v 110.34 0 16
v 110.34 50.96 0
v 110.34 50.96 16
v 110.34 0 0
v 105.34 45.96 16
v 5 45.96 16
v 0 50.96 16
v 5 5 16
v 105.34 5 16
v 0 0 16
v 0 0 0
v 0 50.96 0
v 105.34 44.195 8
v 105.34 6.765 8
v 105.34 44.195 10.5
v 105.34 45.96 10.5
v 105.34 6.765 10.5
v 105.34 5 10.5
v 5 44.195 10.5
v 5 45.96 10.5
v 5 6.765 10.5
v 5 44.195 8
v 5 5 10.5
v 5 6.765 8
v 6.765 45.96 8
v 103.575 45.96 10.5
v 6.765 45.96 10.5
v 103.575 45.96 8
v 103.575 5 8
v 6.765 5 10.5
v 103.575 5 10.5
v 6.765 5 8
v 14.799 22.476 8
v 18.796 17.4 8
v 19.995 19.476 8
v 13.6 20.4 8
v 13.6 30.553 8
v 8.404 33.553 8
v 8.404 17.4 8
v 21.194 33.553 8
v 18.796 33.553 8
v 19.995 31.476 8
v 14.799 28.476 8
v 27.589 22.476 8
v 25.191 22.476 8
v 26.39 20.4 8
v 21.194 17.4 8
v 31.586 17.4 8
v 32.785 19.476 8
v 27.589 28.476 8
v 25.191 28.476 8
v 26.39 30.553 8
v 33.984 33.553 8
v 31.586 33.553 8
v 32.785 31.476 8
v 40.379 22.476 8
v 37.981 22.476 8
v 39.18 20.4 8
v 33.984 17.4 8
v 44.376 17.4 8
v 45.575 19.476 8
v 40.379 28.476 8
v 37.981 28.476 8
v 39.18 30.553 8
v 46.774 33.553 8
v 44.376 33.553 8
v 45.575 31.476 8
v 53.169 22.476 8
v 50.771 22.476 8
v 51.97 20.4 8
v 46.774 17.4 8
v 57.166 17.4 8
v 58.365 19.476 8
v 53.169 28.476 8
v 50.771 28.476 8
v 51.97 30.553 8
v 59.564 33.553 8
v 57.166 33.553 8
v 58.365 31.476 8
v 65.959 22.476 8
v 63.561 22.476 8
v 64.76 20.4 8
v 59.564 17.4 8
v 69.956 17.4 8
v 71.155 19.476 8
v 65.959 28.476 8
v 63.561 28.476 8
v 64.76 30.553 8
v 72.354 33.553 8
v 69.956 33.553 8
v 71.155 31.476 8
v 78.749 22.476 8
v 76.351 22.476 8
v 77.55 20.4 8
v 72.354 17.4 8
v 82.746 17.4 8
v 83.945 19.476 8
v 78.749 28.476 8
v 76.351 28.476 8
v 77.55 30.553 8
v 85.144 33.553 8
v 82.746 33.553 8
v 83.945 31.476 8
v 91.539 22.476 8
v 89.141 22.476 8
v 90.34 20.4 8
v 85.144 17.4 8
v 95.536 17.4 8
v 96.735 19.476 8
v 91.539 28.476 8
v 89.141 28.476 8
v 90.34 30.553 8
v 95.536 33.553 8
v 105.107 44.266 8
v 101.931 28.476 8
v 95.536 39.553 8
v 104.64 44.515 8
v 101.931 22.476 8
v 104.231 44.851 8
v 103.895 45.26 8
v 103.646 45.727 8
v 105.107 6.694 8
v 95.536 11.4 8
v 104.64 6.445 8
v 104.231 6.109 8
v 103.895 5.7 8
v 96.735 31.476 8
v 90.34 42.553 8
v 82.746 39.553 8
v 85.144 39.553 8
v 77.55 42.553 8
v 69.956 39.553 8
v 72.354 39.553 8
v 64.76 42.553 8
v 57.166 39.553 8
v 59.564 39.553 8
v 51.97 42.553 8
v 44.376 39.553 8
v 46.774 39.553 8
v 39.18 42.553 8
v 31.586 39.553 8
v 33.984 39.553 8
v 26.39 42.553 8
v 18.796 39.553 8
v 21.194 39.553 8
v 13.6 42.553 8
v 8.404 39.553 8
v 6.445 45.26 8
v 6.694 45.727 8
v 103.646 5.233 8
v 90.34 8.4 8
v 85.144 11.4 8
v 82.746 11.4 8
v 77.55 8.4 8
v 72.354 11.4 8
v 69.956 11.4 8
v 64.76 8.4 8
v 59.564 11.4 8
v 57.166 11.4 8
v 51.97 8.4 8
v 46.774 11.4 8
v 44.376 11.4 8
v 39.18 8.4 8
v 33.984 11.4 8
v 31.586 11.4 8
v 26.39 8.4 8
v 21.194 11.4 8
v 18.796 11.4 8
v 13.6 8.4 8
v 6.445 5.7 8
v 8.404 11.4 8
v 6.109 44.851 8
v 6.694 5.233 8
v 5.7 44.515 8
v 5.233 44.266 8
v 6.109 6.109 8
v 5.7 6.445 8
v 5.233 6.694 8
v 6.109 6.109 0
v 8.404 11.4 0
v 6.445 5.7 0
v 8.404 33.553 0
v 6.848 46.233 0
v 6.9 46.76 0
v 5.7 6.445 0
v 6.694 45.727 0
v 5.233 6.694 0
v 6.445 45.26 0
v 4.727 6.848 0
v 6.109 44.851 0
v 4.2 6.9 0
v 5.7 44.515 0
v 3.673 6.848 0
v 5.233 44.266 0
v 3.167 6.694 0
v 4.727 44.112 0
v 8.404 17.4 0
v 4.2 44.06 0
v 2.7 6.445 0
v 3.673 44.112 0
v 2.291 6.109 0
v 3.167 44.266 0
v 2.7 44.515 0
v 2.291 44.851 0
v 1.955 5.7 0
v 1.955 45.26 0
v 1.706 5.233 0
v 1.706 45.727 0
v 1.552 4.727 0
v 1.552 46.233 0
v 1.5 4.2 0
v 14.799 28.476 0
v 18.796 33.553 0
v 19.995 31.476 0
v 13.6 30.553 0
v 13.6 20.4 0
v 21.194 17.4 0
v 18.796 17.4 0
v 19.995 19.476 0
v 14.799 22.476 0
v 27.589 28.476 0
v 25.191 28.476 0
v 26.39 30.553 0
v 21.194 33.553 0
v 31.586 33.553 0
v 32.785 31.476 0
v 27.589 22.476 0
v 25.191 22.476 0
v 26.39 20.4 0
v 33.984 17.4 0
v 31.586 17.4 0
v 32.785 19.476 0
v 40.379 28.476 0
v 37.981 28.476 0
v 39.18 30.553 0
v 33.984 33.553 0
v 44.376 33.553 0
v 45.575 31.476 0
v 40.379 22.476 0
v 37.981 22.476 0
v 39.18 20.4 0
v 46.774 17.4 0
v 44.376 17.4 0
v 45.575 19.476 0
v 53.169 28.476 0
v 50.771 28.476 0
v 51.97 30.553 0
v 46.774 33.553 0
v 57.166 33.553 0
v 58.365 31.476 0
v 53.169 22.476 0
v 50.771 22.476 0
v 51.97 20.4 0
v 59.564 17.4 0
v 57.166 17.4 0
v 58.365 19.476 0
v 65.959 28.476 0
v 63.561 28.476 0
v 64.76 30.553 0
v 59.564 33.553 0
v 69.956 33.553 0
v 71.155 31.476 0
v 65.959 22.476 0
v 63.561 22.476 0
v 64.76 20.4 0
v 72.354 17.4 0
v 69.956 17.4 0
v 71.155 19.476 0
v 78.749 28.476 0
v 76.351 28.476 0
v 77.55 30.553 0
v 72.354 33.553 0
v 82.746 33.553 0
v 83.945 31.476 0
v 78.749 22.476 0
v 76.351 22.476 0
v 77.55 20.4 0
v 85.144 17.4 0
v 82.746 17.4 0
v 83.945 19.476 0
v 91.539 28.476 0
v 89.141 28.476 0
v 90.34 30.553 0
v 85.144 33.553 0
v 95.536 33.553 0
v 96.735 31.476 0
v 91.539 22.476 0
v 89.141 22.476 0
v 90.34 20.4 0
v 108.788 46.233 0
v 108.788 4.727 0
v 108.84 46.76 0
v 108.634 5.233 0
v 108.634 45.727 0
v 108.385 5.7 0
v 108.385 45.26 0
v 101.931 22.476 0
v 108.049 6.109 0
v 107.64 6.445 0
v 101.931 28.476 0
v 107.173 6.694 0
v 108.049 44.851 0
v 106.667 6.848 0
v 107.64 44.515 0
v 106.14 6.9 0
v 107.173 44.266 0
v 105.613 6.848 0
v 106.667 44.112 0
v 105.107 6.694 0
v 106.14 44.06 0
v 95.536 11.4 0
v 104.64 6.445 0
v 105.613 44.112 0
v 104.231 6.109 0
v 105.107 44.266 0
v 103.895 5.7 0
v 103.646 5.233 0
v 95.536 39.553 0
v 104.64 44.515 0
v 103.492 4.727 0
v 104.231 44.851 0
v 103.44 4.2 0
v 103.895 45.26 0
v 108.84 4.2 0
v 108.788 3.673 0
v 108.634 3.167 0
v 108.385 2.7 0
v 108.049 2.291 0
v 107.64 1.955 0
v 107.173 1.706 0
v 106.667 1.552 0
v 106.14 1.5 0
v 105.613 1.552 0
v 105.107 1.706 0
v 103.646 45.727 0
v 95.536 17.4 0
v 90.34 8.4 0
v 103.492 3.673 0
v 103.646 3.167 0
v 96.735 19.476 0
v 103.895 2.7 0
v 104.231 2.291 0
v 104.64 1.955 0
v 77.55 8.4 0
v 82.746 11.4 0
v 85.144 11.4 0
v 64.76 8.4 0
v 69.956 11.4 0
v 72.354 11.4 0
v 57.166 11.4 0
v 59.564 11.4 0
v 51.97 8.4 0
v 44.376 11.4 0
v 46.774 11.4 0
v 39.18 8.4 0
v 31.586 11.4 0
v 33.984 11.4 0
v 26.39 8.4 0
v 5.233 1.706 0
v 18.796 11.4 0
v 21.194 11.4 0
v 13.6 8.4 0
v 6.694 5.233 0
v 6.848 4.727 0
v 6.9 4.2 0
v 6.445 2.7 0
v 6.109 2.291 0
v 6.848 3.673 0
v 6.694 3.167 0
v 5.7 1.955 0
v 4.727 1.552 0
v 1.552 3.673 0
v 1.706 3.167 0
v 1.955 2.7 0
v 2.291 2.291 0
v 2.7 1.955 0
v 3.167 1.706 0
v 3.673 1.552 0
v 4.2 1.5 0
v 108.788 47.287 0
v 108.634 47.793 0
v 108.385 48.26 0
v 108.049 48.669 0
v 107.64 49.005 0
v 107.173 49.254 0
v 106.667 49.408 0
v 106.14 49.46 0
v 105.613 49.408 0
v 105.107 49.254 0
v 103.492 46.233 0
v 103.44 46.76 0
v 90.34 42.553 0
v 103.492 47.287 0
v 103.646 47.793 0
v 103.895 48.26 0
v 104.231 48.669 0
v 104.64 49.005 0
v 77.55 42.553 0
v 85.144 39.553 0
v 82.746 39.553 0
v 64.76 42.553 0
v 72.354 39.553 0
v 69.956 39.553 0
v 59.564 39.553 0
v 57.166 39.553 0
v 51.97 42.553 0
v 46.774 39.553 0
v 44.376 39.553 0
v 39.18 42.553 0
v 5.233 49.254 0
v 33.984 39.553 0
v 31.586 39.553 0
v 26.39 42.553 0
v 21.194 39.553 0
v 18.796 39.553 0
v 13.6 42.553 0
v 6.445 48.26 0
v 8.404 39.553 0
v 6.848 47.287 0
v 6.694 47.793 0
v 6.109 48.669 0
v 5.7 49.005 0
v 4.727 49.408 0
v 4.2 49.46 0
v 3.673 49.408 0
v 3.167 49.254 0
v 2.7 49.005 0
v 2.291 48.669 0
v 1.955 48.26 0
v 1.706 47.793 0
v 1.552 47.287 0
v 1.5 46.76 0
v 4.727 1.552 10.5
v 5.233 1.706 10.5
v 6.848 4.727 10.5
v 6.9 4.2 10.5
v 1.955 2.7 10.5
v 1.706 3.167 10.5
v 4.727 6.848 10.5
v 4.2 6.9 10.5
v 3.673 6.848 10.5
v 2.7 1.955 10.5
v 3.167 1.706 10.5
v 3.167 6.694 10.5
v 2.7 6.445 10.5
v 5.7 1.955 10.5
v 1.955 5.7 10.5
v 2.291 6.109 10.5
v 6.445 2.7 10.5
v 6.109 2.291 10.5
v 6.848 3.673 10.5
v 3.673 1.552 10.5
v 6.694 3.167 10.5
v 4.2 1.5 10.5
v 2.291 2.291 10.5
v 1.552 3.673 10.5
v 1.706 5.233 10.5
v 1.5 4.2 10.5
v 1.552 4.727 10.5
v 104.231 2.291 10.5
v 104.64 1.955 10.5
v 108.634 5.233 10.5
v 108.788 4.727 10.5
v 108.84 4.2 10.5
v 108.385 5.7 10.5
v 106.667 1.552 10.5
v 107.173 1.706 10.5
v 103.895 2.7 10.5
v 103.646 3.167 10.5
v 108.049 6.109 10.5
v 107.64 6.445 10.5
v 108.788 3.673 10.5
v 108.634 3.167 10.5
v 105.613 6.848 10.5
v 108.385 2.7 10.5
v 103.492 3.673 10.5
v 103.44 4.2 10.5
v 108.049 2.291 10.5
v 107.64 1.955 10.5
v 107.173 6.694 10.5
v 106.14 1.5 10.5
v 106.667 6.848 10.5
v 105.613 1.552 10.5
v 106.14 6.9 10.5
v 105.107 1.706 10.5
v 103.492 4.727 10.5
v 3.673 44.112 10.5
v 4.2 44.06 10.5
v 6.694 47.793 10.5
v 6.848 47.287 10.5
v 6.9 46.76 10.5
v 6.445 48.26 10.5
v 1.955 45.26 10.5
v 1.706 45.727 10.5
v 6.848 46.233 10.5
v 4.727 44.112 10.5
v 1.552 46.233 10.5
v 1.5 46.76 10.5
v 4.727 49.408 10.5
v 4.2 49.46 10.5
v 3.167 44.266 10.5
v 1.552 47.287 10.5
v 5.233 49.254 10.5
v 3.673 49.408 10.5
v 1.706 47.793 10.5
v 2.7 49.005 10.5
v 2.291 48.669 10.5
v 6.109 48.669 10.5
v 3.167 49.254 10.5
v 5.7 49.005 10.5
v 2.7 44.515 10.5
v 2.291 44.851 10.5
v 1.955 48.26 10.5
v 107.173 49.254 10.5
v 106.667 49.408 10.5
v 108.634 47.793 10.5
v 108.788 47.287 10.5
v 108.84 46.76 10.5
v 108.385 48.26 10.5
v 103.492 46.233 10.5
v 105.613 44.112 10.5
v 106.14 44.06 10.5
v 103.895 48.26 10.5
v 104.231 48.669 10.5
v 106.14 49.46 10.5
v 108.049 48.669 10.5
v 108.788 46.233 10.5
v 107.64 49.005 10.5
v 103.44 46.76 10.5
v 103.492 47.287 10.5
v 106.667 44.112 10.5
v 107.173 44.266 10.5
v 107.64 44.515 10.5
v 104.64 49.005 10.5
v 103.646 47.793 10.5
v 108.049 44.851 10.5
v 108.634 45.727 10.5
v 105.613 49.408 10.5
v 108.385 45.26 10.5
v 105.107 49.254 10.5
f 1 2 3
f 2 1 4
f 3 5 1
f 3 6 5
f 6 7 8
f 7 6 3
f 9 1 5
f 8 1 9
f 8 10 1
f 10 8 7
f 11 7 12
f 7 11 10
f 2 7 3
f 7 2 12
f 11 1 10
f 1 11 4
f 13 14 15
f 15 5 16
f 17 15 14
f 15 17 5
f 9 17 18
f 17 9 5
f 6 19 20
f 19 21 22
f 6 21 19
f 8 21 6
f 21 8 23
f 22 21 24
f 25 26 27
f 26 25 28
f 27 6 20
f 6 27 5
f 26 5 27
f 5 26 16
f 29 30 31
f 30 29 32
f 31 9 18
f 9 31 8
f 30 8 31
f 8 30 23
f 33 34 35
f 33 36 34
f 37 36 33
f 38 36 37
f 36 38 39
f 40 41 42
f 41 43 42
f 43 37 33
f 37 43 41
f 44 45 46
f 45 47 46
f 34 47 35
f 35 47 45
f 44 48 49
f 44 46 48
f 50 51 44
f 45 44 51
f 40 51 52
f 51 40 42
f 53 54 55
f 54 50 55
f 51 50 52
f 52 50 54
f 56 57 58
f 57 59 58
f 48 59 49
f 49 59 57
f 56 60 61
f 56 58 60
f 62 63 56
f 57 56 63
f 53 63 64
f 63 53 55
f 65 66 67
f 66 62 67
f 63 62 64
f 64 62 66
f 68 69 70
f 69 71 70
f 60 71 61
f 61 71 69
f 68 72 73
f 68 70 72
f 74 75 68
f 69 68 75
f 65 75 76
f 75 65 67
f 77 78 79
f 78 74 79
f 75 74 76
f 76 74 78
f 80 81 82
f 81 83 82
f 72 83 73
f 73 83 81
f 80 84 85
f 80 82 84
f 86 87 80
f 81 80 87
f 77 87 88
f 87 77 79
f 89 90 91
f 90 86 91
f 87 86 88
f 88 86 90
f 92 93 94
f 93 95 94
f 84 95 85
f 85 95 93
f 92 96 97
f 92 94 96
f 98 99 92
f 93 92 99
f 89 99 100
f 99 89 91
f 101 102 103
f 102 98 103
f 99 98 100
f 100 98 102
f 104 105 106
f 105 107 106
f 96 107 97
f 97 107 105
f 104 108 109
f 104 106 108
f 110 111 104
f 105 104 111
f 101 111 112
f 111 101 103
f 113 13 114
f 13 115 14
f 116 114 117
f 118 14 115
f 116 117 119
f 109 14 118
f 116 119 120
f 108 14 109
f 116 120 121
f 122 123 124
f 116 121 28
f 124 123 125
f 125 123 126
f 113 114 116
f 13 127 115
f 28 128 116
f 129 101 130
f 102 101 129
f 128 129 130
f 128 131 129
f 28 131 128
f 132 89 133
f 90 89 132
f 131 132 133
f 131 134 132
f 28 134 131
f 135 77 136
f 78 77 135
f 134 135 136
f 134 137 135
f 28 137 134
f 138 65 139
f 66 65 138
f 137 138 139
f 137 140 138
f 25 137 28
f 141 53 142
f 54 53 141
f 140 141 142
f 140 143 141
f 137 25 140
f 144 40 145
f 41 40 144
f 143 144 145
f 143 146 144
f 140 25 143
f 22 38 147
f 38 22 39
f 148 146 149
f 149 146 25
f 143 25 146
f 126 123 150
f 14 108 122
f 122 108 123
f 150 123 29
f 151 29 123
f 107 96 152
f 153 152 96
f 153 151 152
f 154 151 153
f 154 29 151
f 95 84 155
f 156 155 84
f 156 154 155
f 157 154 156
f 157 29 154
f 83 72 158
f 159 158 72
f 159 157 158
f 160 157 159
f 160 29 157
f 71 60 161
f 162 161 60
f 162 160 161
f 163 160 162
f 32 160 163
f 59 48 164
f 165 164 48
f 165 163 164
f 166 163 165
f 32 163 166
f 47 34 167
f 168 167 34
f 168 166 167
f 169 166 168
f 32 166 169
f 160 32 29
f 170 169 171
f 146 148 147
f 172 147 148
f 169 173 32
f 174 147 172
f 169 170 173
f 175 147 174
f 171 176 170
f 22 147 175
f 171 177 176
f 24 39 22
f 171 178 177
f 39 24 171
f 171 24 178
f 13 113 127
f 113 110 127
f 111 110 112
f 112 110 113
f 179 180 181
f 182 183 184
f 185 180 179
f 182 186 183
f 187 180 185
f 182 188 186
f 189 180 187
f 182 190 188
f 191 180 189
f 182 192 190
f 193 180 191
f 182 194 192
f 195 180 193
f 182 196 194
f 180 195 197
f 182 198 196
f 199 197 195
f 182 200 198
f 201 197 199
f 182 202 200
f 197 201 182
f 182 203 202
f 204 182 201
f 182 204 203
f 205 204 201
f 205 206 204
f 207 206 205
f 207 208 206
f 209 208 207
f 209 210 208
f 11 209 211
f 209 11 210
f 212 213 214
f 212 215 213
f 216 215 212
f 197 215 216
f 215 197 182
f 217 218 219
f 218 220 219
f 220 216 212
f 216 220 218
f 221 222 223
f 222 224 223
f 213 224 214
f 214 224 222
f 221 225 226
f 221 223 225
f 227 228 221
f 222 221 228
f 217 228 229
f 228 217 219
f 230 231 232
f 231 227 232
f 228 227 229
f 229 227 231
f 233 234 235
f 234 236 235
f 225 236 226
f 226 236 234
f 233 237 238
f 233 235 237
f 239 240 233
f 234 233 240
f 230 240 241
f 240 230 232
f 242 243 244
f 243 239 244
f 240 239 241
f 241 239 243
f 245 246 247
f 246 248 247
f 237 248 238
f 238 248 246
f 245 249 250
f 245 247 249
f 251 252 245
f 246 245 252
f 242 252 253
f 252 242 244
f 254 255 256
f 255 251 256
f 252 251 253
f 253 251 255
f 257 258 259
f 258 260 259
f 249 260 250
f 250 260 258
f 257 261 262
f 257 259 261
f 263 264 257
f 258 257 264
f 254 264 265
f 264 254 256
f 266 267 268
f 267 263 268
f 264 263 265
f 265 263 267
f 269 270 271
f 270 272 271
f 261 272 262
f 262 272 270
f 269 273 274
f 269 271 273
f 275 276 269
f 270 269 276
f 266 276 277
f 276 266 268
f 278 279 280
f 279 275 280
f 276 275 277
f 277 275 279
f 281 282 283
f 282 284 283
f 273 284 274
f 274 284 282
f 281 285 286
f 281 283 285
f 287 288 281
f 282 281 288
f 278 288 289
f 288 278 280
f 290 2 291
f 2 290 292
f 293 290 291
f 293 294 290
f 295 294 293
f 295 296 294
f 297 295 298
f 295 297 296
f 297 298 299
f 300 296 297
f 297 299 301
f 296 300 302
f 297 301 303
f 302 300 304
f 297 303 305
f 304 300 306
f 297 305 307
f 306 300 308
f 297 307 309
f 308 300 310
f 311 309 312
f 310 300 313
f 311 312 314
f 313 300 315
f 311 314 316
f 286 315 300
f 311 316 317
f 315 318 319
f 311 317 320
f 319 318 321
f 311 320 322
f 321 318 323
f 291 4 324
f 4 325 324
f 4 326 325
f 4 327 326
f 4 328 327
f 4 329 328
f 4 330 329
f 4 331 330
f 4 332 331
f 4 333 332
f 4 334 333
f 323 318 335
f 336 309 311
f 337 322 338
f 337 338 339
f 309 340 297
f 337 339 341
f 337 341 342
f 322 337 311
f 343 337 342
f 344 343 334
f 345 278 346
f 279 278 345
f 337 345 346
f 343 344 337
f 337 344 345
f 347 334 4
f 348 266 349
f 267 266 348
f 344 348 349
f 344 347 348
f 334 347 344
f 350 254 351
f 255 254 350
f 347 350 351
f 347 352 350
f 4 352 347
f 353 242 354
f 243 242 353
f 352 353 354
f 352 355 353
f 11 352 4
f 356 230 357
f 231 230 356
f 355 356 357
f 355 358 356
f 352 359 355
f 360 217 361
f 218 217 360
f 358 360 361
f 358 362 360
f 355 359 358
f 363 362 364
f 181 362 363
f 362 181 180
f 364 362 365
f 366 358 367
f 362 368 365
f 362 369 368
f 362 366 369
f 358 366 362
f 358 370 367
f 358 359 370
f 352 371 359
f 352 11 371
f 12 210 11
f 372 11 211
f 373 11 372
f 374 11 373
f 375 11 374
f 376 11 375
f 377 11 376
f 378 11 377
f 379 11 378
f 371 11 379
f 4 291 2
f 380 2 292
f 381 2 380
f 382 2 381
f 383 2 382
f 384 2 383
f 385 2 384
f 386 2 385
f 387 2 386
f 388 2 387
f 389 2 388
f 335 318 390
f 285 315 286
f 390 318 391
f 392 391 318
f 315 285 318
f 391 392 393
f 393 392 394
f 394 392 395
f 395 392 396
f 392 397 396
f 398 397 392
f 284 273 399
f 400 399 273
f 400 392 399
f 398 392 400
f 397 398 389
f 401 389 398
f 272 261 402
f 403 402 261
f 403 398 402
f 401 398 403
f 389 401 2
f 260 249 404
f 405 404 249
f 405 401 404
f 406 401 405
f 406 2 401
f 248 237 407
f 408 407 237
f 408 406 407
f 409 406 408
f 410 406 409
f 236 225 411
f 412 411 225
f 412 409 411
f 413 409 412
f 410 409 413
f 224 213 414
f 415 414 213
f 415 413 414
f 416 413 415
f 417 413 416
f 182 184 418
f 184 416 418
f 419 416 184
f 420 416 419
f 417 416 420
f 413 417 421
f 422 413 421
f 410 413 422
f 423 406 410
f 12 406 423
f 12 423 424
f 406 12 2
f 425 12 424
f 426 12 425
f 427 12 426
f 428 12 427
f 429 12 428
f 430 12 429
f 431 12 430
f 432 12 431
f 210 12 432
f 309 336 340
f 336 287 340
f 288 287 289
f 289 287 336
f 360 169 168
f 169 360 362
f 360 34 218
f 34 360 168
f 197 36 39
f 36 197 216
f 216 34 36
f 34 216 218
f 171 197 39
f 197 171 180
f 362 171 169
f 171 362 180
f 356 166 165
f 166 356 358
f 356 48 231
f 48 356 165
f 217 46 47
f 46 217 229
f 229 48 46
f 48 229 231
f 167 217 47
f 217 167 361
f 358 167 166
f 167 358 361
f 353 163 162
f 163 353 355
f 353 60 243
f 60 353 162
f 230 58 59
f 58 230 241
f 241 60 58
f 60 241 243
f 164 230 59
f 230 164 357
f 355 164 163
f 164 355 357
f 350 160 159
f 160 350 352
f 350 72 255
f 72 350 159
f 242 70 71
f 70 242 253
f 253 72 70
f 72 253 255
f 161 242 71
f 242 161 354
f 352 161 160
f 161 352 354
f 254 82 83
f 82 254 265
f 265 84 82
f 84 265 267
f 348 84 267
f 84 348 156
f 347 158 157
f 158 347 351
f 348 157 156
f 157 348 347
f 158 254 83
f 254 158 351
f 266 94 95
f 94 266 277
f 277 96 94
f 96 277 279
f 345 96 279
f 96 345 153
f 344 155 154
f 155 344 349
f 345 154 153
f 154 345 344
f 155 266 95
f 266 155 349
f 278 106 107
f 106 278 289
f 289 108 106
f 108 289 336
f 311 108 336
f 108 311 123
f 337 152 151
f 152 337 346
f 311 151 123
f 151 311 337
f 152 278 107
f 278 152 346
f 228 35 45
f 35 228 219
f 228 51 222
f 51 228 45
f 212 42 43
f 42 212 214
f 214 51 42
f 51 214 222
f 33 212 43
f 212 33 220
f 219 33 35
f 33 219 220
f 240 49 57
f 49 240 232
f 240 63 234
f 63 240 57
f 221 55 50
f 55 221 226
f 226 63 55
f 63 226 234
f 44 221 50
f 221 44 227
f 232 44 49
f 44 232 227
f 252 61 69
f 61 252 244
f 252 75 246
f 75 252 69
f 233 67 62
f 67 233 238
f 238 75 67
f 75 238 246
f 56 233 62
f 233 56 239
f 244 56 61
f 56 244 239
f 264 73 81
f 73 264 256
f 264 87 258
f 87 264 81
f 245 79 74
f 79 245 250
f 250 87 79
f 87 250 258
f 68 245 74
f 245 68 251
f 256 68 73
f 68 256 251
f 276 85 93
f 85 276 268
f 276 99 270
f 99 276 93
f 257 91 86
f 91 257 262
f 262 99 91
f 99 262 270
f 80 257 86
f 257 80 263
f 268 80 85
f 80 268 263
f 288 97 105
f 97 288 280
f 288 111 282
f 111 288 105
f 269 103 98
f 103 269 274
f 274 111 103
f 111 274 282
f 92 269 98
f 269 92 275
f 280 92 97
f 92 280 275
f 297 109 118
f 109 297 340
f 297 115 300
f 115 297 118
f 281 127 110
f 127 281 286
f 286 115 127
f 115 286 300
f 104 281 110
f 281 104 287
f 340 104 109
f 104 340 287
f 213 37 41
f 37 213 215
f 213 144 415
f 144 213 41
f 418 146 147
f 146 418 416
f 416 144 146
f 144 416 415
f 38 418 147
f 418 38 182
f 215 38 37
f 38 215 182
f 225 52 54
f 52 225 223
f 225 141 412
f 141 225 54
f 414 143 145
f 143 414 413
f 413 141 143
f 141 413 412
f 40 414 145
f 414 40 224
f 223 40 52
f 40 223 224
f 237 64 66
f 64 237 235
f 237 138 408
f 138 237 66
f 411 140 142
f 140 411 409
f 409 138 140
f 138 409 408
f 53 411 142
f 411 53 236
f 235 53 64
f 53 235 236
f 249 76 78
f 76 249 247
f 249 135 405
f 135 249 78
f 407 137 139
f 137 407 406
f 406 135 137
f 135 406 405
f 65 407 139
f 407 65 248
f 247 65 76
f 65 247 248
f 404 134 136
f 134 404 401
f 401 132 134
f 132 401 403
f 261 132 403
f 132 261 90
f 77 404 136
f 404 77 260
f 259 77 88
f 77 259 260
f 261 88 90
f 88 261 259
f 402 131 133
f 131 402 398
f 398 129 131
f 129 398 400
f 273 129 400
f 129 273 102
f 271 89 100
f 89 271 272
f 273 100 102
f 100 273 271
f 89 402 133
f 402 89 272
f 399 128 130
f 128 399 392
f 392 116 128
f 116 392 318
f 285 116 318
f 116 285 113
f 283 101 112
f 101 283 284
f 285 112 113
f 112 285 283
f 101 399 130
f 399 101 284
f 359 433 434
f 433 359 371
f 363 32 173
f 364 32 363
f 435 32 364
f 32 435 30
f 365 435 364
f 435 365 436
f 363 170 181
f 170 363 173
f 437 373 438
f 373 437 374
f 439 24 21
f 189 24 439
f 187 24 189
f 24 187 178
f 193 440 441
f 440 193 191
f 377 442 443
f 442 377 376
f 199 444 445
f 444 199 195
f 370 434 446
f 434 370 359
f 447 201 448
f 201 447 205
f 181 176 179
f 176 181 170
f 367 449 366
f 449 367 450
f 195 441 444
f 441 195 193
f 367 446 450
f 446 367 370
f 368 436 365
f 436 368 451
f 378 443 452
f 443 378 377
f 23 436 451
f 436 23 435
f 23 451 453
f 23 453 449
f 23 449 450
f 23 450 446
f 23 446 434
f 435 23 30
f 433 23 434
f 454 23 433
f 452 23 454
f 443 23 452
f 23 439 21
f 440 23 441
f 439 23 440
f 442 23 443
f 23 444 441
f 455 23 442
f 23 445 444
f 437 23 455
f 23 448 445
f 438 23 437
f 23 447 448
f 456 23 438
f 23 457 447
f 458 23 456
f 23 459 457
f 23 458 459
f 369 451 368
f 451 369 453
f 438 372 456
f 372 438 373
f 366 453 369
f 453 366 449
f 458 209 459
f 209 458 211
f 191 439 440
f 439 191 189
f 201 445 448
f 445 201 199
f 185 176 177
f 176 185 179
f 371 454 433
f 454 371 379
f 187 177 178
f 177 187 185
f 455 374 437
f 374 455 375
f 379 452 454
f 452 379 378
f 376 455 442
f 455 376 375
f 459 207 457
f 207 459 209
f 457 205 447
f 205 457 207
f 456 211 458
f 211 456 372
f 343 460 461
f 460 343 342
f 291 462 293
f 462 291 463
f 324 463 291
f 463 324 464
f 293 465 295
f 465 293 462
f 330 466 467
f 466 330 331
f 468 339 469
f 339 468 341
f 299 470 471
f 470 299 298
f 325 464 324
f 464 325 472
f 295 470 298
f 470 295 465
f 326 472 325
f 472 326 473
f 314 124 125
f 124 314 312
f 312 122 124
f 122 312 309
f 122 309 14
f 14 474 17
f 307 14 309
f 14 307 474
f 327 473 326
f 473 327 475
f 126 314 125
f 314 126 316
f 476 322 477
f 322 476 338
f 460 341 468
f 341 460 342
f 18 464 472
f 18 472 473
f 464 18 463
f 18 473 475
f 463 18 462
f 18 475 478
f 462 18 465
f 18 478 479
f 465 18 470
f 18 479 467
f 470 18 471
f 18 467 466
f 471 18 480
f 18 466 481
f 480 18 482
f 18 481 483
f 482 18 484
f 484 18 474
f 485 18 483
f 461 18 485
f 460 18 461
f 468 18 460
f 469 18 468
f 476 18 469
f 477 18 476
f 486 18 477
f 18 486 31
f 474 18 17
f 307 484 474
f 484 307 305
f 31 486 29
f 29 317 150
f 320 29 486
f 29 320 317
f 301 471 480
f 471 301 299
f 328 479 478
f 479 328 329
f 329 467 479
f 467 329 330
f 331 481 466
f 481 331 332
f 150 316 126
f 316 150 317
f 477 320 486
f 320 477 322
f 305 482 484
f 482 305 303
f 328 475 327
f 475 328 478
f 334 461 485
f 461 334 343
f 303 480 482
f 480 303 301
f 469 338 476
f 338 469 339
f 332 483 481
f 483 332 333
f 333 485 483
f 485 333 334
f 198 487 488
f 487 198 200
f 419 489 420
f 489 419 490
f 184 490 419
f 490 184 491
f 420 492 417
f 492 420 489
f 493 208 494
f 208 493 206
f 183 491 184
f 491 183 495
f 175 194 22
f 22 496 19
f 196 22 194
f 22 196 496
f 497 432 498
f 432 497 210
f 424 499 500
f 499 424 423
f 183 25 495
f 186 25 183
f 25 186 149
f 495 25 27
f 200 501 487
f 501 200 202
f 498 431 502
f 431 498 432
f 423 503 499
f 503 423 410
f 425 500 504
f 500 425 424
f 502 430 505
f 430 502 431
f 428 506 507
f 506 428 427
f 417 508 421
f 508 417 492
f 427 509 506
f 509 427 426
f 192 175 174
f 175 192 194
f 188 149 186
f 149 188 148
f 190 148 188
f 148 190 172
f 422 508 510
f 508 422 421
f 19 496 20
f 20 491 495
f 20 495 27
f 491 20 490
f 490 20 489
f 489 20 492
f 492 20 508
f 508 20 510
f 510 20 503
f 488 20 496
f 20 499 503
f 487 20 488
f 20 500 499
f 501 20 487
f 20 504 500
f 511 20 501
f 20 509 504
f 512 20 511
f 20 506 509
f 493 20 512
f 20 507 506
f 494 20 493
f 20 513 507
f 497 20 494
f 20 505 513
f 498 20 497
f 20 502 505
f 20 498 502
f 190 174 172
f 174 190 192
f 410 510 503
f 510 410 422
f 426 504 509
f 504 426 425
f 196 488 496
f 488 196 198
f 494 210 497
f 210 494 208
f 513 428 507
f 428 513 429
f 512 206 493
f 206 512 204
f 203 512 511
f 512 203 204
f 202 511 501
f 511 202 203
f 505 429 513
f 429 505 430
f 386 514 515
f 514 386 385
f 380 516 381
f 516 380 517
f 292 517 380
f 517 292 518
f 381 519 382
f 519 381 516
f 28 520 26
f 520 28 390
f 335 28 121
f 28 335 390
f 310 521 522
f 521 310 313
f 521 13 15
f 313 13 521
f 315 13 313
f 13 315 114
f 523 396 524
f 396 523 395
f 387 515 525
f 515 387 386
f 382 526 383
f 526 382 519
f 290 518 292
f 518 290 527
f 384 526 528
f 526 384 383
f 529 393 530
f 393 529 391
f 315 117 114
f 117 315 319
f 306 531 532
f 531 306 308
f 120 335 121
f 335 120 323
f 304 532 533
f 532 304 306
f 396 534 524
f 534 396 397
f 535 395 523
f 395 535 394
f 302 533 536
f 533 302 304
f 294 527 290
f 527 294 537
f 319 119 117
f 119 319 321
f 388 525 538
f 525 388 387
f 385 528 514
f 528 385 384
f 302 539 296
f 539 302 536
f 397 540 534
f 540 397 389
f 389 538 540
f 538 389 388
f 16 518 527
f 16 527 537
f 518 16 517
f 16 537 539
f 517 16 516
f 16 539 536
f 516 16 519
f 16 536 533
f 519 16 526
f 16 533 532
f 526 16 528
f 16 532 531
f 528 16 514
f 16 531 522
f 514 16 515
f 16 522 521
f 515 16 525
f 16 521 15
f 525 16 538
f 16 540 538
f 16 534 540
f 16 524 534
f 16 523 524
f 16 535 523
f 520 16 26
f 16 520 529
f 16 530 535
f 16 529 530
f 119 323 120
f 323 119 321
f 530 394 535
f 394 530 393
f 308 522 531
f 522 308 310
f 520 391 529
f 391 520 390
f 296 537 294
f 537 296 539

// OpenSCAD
$fn = 32;

// ----------------------------------------------------------------------
// Honeycomb panel: 110.34 x 50.96 mm, 21 cells of 12 mm
// ----------------------------------------------------------------------

// --- parameters (mm) ---
panel_w = 110.34;         // panel width
panel_d = 50.96;          // panel depth
thick = 8;                // panel thickness
cell_r = 6;               // hex cell circumradius
pitch = 12.79;            // hex cell pitch (centre to centre)
web = 2.4;                // web between the cells
columns = 7;              // columns of cells
rows = 3;                 // rows of cells
cell_count = 21;          // total cells
shift_x = 13.6;           // first cell offset in x
shift_y = 14.4;           // first cell offset in y
mount_d = 5.4;            // corner mounting holes
hole_off = 4.2;           // mounting hole offset from the corners
rim_h = 16;               // rim height
rim_t = 5;                // rim wall thickness

difference() {
  union() {
    cube([panel_w, panel_d, thick]);
    /* rim around the panel, sunk 1 mm into the plate */
    translate([0, 0, thick - 1]) difference() {
      cube([panel_w, panel_d, rim_h - thick + 1]);
      translate([rim_t, rim_t, -2.5]) cube([panel_w - 2 * rim_t, panel_d - 2 * rim_t, rim_h - thick + 6]);
    }
  }
  /* hexagonal cells, point-up, cut right through the plate */
  for (row = [0 : rows - 1]) {
    for (col = [0 : columns - 1]) {
      translate([shift_x + col * pitch + (row % 2) * pitch / 2, shift_y + row * pitch * 0.866025, -2.5]) rotate([0, 0, 30]) cylinder(h = thick + 5, d = 2 * cell_r, $fn = 6);
    }
  }
  /* corner mounting holes, clear of the outer cell web */
  translate([4.2, 4.2, -2.5]) cylinder(h = thick + 5, d = mount_d);
  translate([106.14, 4.2, -2.5]) cylinder(h = thick + 5, d = mount_d);
  translate([4.2, 46.76, -2.5]) cylinder(h = thick + 5, d = mount_d);
  translate([106.14, 46.76, -2.5]) cylinder(h = thick + 5, d = mount_d);
}
